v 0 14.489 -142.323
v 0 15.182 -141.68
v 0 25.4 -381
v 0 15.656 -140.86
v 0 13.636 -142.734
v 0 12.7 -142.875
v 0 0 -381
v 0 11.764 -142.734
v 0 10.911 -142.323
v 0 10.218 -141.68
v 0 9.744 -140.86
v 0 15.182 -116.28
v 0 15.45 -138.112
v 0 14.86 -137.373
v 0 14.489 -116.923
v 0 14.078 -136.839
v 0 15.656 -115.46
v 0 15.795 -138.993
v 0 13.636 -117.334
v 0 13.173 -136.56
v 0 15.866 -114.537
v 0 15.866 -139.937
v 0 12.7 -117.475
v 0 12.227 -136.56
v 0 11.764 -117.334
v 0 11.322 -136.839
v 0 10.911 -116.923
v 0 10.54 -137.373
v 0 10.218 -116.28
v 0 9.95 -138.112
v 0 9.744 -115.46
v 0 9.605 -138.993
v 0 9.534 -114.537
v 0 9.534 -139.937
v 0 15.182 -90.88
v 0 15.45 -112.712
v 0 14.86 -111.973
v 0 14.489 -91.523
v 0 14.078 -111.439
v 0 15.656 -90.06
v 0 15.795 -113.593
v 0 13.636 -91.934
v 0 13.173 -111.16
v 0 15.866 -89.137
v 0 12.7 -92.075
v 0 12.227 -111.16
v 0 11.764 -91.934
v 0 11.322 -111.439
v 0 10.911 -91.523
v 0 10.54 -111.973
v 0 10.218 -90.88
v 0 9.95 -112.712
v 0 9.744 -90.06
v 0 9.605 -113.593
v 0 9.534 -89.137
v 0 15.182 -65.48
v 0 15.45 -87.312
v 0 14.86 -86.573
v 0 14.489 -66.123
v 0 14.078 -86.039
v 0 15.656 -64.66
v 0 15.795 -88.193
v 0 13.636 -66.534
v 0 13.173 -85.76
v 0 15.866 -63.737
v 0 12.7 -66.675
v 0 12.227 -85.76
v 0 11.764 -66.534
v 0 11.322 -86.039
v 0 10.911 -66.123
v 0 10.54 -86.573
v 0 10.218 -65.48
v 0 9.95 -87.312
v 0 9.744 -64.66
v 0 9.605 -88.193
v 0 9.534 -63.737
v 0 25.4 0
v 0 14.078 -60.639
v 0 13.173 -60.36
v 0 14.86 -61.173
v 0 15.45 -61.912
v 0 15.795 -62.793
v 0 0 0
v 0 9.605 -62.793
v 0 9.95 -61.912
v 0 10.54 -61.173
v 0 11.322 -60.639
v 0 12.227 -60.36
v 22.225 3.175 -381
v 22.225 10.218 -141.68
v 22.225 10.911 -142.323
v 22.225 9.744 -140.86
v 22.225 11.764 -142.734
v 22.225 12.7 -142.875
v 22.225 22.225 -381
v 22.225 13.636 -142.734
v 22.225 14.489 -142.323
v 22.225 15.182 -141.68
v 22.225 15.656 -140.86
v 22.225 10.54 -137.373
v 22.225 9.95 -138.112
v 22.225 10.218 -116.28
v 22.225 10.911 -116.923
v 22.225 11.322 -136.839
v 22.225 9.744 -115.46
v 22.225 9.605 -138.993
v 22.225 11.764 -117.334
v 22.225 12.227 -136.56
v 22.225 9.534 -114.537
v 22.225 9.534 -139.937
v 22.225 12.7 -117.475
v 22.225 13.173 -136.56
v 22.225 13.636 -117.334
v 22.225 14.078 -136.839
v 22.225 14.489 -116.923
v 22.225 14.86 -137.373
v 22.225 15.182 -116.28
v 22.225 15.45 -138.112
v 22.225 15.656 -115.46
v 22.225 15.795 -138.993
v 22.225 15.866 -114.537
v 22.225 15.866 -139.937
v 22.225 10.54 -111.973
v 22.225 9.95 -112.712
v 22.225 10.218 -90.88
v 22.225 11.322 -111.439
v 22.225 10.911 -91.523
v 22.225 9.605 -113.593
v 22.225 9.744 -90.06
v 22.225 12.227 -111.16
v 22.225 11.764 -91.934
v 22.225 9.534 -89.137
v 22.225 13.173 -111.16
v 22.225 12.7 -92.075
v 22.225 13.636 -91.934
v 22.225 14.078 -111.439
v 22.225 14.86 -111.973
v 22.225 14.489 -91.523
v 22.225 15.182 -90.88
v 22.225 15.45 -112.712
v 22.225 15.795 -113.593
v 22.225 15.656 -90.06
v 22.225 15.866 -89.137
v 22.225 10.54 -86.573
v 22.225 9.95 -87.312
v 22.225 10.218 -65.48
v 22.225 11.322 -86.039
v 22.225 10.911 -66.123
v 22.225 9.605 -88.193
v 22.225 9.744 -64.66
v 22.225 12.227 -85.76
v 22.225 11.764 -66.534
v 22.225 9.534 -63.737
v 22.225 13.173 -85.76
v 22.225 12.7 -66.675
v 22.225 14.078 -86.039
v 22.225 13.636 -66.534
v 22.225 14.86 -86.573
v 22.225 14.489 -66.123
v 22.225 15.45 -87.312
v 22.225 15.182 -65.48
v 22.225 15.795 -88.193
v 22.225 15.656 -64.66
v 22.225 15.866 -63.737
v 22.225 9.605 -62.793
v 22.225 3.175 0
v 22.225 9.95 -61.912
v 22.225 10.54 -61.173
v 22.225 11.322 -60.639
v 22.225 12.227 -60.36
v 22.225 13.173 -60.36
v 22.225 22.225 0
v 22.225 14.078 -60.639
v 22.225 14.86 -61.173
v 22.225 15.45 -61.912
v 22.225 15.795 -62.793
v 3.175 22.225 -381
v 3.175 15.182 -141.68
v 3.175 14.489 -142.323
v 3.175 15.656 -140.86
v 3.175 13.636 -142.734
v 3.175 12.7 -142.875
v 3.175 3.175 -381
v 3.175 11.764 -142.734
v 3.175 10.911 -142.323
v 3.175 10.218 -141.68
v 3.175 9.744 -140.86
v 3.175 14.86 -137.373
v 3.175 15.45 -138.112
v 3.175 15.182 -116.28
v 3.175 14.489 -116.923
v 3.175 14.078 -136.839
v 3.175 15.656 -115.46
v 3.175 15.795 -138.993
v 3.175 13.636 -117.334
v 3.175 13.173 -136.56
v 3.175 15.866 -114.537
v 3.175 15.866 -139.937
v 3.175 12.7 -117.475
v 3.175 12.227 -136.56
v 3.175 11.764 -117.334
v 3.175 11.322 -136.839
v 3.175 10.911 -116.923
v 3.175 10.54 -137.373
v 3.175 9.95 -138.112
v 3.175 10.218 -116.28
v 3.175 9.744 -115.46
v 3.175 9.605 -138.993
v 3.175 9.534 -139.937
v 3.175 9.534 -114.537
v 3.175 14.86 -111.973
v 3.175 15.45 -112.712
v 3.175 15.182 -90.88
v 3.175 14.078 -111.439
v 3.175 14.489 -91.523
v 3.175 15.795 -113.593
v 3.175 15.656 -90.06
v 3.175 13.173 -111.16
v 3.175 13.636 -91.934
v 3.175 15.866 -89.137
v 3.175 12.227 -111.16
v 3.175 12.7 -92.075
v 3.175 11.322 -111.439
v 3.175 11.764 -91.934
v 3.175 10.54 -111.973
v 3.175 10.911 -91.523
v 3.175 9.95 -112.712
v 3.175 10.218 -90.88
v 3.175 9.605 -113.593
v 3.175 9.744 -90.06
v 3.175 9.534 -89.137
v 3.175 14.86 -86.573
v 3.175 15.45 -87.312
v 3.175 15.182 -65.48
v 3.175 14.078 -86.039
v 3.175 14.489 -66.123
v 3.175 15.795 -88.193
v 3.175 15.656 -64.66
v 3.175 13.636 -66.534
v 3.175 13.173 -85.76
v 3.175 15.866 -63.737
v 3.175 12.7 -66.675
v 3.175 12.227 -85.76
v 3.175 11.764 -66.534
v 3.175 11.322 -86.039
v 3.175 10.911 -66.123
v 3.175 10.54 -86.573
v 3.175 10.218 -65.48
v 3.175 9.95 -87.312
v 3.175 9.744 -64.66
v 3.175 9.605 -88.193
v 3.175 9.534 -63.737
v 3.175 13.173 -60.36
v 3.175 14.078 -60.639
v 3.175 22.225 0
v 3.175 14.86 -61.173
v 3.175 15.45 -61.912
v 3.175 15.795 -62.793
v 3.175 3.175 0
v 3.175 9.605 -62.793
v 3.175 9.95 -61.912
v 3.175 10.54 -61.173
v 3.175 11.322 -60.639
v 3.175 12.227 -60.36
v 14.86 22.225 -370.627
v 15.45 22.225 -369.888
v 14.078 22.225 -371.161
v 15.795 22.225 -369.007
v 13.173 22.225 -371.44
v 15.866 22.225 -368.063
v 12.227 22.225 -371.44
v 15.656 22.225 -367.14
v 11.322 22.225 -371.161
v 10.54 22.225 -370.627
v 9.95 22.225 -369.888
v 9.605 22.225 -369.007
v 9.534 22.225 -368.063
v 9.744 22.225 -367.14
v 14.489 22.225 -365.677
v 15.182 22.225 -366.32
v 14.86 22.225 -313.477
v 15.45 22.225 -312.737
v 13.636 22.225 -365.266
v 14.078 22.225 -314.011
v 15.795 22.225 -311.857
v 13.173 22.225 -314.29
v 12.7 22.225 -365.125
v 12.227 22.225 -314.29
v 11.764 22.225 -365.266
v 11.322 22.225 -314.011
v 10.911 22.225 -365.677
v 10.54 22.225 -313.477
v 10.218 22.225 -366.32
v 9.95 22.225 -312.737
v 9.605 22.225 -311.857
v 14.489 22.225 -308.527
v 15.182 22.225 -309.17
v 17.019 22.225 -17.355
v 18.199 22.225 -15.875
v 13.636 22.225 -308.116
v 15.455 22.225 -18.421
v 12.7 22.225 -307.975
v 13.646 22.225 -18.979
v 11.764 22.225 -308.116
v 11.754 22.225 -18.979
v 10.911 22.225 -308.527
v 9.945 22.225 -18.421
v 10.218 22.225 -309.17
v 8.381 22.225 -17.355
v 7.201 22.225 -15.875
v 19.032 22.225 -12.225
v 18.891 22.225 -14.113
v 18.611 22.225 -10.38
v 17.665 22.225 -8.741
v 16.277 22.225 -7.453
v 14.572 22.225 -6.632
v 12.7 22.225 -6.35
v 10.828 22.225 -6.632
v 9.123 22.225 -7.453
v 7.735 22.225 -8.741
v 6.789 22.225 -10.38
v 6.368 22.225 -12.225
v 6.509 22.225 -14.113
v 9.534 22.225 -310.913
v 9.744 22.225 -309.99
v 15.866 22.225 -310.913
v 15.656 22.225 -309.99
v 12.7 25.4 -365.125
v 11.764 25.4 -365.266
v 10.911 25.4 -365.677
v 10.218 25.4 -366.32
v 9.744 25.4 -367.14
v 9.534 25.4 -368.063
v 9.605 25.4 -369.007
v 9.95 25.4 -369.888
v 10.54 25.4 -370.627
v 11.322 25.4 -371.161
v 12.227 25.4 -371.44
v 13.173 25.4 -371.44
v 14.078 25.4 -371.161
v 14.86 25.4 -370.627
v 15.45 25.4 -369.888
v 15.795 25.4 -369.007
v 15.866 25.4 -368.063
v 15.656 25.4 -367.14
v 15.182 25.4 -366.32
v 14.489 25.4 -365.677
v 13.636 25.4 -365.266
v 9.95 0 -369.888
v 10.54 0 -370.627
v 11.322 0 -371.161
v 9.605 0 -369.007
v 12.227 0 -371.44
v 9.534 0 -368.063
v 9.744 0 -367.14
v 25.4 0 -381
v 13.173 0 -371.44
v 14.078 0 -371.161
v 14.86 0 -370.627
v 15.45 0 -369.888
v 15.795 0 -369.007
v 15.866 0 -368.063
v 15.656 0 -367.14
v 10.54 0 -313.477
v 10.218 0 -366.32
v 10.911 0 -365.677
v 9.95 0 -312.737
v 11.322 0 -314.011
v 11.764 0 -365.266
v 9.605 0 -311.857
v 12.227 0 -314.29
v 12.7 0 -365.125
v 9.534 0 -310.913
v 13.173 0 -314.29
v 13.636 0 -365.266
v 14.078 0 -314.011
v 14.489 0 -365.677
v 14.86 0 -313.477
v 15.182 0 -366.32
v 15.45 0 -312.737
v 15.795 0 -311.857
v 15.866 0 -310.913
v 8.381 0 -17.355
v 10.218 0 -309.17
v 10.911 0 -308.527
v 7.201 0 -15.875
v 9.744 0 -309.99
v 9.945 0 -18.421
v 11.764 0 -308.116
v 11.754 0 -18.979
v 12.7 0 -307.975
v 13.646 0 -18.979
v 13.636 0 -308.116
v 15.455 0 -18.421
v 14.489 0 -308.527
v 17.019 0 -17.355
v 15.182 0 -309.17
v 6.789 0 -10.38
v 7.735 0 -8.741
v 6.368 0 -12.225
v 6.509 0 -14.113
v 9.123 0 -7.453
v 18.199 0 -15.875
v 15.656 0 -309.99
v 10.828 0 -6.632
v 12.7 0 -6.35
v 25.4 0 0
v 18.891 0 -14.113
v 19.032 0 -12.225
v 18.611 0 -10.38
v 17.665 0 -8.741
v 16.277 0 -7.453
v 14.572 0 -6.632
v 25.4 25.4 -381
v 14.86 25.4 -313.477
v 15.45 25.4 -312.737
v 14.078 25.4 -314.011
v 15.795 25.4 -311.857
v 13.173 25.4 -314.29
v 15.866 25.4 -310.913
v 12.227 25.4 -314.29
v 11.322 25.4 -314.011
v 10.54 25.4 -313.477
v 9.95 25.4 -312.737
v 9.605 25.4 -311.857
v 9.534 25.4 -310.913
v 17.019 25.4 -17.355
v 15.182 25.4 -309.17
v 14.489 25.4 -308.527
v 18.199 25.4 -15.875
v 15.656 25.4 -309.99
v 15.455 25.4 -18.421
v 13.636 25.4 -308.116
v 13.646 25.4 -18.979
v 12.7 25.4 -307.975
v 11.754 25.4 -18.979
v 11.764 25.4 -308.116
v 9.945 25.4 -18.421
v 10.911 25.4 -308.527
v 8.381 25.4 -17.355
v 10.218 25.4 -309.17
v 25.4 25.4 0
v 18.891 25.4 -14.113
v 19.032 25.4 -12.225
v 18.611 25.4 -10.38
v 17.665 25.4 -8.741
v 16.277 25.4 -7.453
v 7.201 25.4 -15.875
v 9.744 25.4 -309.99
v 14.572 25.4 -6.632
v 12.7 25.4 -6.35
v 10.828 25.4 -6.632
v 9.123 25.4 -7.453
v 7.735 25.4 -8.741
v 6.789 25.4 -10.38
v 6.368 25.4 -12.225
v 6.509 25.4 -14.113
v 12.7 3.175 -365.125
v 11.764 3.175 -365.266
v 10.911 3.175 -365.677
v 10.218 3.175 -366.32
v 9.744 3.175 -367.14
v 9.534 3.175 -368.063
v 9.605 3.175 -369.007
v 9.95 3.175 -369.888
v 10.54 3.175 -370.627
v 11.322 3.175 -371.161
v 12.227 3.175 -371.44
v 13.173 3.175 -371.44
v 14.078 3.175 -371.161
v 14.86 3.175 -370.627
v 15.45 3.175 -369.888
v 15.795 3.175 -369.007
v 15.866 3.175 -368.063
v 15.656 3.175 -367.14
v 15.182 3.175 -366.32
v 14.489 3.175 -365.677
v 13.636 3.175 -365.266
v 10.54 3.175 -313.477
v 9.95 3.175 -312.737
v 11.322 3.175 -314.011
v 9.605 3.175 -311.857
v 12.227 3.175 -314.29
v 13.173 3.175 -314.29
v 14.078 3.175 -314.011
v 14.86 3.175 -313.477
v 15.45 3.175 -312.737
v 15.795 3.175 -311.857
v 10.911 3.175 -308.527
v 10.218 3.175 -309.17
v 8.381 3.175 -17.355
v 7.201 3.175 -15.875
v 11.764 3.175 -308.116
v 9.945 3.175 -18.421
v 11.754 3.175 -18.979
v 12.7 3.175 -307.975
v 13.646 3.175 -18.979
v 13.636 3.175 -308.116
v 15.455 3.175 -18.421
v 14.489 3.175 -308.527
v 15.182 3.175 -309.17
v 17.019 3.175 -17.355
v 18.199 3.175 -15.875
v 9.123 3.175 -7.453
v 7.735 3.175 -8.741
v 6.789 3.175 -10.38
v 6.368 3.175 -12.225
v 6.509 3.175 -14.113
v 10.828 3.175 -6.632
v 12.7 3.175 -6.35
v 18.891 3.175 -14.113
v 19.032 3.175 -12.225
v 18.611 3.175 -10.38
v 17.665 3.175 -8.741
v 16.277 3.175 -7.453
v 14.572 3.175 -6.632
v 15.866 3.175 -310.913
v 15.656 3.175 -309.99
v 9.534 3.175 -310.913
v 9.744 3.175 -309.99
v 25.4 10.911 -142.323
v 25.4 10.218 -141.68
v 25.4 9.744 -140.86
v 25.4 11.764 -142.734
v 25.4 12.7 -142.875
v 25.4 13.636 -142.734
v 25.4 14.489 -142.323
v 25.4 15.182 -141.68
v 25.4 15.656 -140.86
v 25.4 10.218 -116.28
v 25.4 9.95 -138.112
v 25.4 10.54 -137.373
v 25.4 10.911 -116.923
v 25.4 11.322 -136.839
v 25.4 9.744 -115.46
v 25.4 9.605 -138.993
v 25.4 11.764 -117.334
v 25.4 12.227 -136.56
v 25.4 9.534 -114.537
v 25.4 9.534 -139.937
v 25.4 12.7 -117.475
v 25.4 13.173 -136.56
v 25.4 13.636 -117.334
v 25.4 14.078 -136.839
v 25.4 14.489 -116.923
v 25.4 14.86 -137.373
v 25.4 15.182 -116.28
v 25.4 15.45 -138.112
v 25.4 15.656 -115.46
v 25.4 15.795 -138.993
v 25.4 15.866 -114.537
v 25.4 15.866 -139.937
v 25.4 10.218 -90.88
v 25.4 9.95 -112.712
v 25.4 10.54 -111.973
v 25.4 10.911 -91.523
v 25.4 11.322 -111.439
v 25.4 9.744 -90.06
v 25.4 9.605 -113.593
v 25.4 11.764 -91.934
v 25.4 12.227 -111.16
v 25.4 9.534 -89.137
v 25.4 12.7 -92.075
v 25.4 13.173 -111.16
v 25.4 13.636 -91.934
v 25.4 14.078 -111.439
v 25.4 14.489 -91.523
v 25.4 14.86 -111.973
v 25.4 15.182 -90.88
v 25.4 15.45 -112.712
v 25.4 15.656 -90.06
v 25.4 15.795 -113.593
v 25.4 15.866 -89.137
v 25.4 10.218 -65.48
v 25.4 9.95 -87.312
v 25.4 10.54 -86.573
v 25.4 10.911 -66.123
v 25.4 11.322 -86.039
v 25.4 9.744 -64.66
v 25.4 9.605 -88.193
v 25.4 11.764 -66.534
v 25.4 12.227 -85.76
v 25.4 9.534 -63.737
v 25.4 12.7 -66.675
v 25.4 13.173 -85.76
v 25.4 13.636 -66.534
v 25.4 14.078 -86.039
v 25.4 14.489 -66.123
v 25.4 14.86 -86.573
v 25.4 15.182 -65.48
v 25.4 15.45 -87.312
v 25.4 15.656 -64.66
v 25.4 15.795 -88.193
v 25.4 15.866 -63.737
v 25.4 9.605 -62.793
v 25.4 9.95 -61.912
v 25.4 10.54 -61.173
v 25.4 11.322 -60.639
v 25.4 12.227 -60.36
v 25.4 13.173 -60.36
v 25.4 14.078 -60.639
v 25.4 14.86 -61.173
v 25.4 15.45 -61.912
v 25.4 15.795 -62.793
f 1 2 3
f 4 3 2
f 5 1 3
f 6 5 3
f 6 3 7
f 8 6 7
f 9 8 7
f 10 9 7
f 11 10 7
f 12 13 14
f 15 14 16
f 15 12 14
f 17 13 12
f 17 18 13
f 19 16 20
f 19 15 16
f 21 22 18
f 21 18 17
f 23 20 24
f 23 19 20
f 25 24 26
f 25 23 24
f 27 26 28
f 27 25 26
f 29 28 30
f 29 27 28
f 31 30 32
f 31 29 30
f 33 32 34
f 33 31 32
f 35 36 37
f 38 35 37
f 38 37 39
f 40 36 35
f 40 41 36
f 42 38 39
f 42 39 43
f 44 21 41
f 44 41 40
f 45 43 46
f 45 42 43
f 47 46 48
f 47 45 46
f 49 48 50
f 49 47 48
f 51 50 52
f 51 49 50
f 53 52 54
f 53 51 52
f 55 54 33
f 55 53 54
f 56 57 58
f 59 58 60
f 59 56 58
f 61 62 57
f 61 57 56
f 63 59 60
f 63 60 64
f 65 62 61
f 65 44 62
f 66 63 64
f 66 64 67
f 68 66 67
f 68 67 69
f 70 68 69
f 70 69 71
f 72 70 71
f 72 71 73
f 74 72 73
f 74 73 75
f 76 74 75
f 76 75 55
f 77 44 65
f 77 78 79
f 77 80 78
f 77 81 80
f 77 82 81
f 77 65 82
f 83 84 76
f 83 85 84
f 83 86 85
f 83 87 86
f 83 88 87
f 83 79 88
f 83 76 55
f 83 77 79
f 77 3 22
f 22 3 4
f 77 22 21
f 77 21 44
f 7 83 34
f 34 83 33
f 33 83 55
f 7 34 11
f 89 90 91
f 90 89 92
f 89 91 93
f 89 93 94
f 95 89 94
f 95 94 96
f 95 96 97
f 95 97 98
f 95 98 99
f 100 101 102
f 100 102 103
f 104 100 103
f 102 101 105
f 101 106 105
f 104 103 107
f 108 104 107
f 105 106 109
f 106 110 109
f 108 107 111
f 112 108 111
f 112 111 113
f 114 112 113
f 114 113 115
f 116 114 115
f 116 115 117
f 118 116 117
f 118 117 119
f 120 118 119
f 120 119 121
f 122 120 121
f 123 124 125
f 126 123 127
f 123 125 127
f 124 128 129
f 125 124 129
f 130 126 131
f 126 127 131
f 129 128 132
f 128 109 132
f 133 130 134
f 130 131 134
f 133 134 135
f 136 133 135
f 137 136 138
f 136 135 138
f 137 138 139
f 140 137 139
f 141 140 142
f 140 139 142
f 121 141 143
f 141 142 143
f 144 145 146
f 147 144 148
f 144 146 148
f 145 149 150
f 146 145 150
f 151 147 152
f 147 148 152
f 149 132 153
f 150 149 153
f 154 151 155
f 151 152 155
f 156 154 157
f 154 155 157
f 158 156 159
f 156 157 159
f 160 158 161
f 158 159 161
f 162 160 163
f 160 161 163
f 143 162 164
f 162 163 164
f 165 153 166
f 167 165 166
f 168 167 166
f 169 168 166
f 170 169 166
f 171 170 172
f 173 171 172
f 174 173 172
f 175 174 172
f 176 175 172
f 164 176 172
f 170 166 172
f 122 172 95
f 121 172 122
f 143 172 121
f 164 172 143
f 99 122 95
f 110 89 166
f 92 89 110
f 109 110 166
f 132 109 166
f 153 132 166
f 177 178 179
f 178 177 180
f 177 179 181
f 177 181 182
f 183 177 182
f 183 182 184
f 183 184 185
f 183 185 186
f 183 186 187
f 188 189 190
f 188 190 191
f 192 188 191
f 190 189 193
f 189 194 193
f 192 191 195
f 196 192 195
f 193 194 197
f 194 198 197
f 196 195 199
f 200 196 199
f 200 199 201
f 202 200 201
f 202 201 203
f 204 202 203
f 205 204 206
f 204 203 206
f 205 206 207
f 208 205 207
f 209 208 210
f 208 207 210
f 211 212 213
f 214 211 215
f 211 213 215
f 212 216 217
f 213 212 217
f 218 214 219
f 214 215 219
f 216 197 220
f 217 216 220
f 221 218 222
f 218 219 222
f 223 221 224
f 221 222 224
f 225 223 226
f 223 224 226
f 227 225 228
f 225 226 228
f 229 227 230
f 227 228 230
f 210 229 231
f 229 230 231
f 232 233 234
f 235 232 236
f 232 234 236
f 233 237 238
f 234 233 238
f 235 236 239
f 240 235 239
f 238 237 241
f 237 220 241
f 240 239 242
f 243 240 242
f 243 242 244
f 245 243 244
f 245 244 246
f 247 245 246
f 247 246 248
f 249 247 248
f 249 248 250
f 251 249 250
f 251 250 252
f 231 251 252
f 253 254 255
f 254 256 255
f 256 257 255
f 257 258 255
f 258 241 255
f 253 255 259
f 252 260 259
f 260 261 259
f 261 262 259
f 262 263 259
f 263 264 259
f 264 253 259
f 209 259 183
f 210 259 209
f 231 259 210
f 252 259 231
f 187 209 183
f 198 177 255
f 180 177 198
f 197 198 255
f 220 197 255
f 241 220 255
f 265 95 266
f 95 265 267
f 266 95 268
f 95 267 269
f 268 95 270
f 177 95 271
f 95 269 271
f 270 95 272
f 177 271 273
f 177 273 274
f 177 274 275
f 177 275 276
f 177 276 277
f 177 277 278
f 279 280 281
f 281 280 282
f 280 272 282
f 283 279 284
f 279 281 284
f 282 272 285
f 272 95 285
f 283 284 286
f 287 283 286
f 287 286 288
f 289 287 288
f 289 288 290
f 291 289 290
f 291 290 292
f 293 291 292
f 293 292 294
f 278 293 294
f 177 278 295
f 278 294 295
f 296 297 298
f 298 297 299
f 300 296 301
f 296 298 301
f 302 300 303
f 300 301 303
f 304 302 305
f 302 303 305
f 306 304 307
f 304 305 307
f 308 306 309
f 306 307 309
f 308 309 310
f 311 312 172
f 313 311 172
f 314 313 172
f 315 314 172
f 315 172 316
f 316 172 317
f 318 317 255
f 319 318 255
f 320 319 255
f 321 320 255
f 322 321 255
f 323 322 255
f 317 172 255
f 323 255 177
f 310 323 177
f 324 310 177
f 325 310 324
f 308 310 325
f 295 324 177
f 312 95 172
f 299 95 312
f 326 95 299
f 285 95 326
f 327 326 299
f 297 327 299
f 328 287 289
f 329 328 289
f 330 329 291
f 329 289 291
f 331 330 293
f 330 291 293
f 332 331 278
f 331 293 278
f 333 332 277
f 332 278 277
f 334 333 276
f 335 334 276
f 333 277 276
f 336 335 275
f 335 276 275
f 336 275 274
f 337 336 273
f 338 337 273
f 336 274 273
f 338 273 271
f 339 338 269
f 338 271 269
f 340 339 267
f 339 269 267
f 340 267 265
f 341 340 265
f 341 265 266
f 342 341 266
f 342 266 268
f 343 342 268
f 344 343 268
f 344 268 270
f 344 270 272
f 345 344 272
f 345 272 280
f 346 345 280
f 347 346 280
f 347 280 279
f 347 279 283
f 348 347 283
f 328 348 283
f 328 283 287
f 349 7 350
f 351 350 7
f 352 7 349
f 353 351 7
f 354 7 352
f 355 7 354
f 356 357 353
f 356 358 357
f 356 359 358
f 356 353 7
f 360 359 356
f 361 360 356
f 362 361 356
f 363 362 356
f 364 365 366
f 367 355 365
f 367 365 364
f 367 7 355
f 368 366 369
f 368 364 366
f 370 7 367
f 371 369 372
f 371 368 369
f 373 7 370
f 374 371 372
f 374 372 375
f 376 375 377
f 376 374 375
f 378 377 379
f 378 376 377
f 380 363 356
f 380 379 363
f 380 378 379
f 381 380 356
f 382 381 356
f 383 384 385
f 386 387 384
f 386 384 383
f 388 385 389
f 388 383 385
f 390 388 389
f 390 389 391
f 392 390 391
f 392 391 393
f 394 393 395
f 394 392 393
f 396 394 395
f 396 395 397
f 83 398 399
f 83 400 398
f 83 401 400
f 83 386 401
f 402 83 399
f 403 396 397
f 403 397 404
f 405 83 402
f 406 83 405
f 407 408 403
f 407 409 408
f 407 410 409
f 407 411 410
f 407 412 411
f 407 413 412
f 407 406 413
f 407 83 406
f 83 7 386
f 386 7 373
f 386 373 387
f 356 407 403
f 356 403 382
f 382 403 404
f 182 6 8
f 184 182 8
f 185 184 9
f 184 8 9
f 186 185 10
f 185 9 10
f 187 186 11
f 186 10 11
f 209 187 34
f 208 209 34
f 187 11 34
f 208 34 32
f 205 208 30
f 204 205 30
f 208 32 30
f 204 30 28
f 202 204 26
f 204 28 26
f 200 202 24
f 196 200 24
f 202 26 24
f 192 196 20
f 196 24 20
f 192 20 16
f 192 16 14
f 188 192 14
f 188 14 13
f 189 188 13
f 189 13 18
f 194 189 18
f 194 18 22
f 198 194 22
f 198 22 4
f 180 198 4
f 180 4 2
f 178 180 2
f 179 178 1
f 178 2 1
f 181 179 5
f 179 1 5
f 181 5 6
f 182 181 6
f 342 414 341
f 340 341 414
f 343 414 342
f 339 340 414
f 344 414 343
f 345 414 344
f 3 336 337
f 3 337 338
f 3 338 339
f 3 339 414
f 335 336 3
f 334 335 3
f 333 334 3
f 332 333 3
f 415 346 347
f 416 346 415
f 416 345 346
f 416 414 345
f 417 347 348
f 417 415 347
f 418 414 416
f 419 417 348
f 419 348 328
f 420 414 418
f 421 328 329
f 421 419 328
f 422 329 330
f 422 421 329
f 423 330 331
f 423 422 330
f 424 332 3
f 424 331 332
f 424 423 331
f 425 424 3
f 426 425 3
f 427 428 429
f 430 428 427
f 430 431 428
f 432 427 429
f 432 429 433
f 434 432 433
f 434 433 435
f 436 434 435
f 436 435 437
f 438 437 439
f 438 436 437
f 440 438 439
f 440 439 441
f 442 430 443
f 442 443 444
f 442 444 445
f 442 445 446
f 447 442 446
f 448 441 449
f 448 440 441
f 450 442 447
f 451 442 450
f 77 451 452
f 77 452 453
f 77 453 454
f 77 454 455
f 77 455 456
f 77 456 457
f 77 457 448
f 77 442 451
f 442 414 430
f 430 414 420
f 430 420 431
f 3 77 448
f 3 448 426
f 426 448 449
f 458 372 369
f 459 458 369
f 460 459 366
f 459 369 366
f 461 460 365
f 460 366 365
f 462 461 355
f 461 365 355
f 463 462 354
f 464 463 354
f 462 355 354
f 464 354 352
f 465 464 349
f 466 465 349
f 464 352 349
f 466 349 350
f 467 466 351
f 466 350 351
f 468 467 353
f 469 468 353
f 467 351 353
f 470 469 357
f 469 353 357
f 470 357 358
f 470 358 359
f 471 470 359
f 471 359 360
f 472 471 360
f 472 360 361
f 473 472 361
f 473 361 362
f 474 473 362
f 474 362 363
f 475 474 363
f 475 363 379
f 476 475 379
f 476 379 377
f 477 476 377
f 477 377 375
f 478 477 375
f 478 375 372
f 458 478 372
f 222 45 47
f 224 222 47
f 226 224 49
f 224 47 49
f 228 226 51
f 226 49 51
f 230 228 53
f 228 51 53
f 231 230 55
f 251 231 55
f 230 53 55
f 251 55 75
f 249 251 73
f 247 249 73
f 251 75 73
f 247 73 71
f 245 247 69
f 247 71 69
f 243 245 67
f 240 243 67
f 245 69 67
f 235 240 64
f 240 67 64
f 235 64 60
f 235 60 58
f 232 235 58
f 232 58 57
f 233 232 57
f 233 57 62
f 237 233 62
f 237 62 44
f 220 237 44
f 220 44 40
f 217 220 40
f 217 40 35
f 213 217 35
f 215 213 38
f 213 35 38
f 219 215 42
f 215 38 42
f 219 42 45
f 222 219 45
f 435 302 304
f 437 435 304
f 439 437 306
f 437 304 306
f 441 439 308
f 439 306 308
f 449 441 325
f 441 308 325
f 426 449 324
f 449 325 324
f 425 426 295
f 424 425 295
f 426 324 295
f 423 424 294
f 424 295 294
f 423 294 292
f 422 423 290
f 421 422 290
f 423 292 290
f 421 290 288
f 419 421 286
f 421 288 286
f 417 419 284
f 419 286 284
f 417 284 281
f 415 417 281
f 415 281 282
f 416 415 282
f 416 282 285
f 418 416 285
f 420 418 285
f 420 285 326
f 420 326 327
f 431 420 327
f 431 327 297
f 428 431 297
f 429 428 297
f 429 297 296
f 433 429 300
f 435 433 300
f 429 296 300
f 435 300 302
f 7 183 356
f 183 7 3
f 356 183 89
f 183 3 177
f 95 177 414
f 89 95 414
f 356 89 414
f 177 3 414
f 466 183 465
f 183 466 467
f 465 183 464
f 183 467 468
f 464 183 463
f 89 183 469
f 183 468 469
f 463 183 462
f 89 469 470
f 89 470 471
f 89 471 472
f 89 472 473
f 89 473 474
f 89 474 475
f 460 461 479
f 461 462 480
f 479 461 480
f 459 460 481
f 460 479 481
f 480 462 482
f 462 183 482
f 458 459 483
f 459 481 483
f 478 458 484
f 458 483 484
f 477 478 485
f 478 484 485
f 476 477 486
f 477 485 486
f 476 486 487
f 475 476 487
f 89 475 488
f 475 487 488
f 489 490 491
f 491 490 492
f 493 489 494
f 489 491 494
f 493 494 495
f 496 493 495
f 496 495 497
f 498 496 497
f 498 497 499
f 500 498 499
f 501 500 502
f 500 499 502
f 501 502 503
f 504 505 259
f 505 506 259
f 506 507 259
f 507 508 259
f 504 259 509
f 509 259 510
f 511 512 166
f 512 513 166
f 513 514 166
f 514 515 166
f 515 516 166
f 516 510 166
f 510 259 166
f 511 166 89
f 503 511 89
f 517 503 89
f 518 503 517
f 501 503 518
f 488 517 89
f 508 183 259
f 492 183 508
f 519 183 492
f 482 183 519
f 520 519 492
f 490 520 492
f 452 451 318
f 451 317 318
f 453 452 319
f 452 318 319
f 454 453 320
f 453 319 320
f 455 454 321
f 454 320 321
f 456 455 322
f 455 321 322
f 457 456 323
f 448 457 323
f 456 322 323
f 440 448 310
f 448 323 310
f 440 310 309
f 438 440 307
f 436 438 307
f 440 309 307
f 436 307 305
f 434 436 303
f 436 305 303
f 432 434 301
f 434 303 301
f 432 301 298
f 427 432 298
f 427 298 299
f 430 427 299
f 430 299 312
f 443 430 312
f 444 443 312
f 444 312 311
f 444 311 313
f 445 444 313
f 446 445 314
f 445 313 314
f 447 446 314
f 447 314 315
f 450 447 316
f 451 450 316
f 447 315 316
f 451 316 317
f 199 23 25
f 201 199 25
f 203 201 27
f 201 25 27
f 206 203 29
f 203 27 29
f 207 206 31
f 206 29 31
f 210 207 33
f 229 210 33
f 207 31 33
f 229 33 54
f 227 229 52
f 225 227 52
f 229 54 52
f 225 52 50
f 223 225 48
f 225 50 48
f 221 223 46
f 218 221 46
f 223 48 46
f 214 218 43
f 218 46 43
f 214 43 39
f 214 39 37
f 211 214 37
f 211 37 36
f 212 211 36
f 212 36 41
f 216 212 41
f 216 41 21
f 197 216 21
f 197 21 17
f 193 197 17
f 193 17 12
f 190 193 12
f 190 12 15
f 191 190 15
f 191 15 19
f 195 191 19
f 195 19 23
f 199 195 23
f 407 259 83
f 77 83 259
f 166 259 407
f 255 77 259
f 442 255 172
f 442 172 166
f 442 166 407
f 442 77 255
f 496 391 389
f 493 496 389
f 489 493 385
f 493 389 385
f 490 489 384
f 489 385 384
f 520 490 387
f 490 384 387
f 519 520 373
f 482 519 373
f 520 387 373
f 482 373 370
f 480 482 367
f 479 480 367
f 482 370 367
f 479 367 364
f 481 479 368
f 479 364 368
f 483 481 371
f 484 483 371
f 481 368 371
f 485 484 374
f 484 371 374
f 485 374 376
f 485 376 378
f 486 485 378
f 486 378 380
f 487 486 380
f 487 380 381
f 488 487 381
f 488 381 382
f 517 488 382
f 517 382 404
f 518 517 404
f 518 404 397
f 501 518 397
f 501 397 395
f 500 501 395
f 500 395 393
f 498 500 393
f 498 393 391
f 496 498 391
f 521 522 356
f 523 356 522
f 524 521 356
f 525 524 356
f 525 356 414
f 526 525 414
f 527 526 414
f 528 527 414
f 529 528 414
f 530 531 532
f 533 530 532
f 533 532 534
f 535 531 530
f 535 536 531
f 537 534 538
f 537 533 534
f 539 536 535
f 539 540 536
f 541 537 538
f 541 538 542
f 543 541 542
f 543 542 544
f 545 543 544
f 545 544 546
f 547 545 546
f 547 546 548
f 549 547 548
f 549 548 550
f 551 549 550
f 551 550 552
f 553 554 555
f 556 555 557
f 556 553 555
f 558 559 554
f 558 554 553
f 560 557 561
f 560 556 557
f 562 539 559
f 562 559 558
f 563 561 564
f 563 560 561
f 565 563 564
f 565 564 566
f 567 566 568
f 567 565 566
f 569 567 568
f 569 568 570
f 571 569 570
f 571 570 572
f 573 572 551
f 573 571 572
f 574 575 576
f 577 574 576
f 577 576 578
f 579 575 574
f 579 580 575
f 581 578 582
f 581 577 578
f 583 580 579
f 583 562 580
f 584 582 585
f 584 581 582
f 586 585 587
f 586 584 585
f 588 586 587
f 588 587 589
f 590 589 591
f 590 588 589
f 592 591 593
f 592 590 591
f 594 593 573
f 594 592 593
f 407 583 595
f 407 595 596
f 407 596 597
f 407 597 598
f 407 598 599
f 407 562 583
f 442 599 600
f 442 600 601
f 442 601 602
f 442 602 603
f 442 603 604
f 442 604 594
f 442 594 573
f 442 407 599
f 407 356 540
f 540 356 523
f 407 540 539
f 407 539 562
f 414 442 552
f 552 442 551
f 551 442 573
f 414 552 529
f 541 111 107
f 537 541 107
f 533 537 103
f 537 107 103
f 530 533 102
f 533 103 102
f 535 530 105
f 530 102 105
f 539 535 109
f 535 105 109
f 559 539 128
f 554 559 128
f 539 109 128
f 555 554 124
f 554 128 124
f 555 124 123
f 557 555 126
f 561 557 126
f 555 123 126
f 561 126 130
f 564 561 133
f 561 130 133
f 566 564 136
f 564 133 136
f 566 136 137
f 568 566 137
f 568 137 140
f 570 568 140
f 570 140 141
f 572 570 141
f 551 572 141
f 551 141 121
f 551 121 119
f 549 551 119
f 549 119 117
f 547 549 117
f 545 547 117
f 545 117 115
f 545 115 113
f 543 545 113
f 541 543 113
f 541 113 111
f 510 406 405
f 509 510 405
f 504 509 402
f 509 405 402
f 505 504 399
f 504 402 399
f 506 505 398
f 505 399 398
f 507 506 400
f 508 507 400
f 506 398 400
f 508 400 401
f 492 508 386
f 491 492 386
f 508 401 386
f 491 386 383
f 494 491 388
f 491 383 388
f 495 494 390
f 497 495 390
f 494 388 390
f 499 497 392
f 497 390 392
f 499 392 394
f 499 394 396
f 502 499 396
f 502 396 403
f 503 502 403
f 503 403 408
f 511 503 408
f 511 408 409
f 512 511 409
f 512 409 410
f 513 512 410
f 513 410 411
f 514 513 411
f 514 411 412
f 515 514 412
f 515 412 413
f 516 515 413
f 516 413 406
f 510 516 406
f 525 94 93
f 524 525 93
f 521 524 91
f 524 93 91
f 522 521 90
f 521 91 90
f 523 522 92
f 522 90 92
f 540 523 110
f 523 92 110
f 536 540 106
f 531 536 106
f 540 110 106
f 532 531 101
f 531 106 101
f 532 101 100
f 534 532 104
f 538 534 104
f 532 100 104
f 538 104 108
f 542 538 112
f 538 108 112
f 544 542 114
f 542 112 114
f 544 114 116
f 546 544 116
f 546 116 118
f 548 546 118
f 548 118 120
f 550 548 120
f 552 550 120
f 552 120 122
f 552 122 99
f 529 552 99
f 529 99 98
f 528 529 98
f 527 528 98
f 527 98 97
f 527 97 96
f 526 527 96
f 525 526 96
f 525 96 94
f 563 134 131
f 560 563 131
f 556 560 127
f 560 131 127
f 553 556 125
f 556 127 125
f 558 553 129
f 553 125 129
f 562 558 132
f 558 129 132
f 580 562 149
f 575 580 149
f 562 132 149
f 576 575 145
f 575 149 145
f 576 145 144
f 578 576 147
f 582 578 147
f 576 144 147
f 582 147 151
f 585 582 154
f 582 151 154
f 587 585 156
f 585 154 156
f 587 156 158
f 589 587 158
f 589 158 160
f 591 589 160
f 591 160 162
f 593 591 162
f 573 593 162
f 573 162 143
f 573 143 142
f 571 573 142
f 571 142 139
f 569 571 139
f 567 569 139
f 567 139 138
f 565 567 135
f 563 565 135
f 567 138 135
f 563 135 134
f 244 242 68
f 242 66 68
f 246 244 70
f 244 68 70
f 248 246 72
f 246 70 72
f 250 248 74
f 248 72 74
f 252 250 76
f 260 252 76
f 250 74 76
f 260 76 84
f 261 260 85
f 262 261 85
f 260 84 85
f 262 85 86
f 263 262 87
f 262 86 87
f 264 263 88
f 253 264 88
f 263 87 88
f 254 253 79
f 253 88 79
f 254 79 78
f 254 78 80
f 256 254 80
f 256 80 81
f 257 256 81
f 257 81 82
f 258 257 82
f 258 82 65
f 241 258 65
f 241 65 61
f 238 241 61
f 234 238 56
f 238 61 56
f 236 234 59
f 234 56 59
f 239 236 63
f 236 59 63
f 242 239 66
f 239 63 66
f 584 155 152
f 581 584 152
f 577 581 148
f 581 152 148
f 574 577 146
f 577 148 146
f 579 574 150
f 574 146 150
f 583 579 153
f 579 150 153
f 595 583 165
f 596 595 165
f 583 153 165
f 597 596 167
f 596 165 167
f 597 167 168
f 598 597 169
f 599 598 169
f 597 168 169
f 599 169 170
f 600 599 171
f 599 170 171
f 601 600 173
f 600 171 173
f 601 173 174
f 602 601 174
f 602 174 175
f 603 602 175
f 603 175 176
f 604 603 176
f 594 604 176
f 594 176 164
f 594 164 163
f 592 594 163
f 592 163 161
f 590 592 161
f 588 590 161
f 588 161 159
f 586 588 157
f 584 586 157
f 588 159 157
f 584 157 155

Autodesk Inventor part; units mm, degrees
ref_plane "YZ Plane" through (0, 0, 0) normal (1, 0, 0) x (0, 1, 0)
ref_plane "XZ Plane" through (0, 0, 0) normal (0, 1, 0) x (-1, 0, 0)
ref_plane "XY Plane" through (0, 0, 0) normal (0, 0, 1) x (1, 0, 0)
sketch "Sketch1" plane through (0, 0, 0) normal (0, 0, 1) x (1, 0, 0)
  line L0 (0, 0) -> (25.4, 0)
  line L1 (25.4, 0) -> (25.4, 25.4)
  line L2 (25.4, 25.4) -> (0, 25.4)
  line L3 (0, 25.4) -> (0, 0)
  line L4 (3.175, 3.175) -> (22.225, 3.175)
  line L5 (22.225, 3.175) -> (22.225, 22.225)
  line L6 (22.225, 22.225) -> (3.175, 22.225)
  line L7 (3.175, 22.225) -> (3.175, 3.175)
  dimension "d0" = 25.4
  dimension "d1" = 25.4
  dimension "d2" = 3.175
extrude "Extrusion1" add sketch "Sketch1" against normal blind 381
sketch "Sketch2" plane through (0, 25.4, 0) normal (0, 1, 0) x (1, 0, 0)
  line L0 (25.4, 381) -> (0, 381) projected
  line L1 (25.4, 0) -> (0, 0) projected
  line L2 (25.4, 0) -> (25.4, 381) projected
  point P0 (12.7, 368.3)
  point P1 (12.7, 311.15)
  point P2 (12.7, 12.7)
  dimension "d5" = 12.7
  dimension "d6" = 57.15
  dimension "d25" = 12.7
  dimension "d26" = 12.7
hole "Hole1" at (12.7, 25.4, -368.3) at (12.7, 25.4, -311.15) direction (0, -1, 0) diameter 6.35 depth 25.4 tip angle 118
sketch "Sketch3" plane through (25.4, 0, 0) normal (1, 0, 0) x (0, 0, -1)
  line L0 (0, 0) -> (0, 25.4) projected
  point P0 (63.5, 12.7)
  point P1 (0, 12.7)
  point P2 (88.9, 12.7)
  point P3 (114.3, 12.7)
  point P4 (0, 12.7)
  point P5 (139.7, 12.7)
  dimension "d14" = 63.5
  dimension "d15" = 25.4
  dimension "d16" = 25.4
  dimension "d24" = 139.7
hole "Hole2" at (25.4, 12.7, -63.5) at (25.4, 12.7, -88.9) at (25.4, 12.7, -114.3) at (25.4, 12.7, -139.7) direction (-1, 0, 0) diameter 6.35 depth 25.4 tip angle 118
hole "Hole3" at (12.7, 25.4, -12.7) direction (0, -1, 0) diameter 12.7 depth 25.4 tip angle 118
properties part number "bambar 12 in"
